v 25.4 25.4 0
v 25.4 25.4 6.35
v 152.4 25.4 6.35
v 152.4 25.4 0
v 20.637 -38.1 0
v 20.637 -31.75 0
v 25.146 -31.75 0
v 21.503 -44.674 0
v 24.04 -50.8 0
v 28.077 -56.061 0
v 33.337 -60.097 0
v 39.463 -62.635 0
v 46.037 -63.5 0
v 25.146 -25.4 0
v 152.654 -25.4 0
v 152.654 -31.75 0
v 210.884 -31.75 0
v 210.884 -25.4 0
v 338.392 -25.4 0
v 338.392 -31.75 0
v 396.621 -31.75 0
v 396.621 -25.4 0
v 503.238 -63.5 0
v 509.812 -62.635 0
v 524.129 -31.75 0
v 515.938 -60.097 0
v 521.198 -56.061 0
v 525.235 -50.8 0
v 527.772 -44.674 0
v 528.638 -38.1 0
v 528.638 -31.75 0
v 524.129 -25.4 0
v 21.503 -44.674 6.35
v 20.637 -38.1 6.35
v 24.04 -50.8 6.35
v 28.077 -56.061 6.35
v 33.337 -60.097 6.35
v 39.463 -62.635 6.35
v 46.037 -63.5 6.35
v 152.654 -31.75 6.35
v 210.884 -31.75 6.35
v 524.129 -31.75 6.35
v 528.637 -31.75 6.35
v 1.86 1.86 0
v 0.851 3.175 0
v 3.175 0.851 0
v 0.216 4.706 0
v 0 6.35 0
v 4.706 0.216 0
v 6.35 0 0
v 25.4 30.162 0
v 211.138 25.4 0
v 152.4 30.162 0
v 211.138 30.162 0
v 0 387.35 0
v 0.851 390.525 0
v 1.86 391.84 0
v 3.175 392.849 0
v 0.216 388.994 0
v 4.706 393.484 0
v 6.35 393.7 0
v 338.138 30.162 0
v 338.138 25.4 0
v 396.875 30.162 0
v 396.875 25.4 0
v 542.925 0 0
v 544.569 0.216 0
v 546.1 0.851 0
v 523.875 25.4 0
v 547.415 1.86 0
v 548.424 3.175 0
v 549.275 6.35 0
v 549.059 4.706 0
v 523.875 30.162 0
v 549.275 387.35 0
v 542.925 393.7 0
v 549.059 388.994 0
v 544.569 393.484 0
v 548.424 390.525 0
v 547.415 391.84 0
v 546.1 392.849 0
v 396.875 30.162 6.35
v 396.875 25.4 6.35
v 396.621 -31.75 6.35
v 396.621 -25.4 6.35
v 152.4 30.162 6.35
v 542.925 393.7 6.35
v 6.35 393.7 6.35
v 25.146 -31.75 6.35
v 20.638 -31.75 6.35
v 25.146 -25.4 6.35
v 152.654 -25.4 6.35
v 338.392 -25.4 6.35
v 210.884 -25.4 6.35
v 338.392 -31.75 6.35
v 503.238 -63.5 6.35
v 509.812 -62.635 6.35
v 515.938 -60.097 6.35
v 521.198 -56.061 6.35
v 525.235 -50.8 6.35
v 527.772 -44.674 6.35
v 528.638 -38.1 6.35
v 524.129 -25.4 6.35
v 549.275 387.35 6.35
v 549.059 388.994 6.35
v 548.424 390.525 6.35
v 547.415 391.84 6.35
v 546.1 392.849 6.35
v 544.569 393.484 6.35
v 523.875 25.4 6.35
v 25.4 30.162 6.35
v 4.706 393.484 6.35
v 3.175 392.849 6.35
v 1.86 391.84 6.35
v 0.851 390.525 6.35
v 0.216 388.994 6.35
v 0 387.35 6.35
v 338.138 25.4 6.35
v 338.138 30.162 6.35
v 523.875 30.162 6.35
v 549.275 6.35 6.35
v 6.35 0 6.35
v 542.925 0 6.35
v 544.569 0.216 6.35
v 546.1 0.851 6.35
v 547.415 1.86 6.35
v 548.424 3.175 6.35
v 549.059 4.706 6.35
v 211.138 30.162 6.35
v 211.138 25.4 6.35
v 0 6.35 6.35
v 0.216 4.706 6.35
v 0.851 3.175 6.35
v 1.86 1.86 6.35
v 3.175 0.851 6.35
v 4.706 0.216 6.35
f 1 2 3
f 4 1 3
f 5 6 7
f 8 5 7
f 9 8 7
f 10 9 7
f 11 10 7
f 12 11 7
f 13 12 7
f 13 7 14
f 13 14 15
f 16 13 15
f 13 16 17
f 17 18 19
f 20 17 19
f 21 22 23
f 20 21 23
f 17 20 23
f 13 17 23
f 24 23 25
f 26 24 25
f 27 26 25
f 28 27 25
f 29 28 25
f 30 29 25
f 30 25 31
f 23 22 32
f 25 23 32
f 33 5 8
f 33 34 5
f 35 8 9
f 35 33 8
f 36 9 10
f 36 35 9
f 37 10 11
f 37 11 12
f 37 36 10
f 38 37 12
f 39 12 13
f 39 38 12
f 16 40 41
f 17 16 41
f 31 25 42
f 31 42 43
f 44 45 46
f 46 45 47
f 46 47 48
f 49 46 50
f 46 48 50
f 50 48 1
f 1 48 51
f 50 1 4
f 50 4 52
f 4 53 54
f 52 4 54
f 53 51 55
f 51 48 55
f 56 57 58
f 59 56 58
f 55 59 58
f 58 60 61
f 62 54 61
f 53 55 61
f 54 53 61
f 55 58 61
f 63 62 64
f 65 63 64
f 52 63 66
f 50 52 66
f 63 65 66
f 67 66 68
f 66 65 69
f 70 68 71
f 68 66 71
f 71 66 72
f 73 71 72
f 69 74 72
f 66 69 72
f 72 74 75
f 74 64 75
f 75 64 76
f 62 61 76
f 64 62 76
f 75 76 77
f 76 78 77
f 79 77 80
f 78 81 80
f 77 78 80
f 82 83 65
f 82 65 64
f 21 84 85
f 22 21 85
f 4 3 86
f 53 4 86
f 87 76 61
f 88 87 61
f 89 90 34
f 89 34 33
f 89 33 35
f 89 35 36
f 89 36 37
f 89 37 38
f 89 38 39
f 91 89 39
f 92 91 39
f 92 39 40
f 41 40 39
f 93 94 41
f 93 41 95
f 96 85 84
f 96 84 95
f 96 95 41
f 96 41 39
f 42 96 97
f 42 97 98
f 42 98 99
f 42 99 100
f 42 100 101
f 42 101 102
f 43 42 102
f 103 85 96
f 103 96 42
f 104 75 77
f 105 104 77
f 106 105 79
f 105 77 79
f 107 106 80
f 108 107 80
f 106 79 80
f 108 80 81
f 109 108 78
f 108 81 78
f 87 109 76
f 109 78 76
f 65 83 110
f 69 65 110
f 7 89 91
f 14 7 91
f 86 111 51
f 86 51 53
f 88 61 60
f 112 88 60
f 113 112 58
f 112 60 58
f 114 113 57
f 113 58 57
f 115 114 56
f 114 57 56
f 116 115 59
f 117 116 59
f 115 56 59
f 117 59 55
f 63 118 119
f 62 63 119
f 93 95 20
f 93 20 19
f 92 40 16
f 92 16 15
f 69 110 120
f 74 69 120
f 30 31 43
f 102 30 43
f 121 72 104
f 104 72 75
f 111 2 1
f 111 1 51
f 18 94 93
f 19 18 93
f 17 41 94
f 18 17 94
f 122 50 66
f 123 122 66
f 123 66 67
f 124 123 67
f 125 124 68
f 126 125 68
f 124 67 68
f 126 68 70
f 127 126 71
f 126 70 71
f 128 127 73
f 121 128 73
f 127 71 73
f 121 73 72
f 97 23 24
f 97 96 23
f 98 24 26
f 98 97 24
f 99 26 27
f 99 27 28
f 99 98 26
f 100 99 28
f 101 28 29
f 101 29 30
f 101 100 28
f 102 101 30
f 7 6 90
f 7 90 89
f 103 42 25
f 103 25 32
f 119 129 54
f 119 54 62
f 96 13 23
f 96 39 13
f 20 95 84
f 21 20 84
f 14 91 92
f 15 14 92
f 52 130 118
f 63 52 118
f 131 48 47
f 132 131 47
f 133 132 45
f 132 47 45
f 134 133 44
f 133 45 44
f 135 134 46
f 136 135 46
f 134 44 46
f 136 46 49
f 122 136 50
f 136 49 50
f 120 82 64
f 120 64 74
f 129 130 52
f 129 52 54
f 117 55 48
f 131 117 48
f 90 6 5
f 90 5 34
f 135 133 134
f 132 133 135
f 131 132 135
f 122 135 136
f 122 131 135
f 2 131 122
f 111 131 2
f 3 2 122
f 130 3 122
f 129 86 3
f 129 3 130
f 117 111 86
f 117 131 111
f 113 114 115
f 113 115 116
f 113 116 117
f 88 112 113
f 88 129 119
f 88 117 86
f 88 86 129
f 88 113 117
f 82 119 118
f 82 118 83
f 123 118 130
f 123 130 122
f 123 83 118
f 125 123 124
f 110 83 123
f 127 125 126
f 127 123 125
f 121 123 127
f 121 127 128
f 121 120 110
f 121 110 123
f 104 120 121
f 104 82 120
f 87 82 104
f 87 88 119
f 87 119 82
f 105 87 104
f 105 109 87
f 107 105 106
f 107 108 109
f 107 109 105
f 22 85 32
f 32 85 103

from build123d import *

# Parameters (mm, degrees)
BOSS_EXTRUDE1_DEPTH = 6.35
SKETCH2_W           = 127
SKETCH2_H           = 4.7625
CUT_EXTRUDE1_DEPTH  = 676.827668955
SKETCH3_W           = 508
SKETCH3_H           = 6.35
BOSS_EXTRUDE2_DEPTH = 38.1
SKETCH8_W           = 4.5085
SKETCH8_H           = 6.35
SKETCH8_W_2         = 58.2295
CUT_EXTRUDE2_DEPTH  = 676.827668955
FILLET1_R           = 25.4


with BuildPart() as part:
    # Sketch1 → Boss-Extrude1 (new body)
    with BuildSketch(Plane.XY):
        with BuildLine():
            Line((6.35, 0), (542.925, 0))
            ThreePointArc((542.925, 0), (547.415128061, 1.859871939), (549.275, 6.35))
            Line((549.275, 6.35), (549.275, 387.35))
            ThreePointArc((549.275, 387.35), (547.415128061, 391.840128061), (542.925, 393.7))
            Line((542.925, 393.7), (6.35, 393.7))
            ThreePointArc((6.35, 393.7), (1.859871939, 391.840128061), (0, 387.35))
            Line((0, 387.35), (0, 6.35))
            ThreePointArc((0, 6.35), (1.859871939, 1.859871939), (6.35, 0))
        make_face()
    extrude(amount=BOSS_EXTRUDE1_DEPTH)

    # Sketch2 → Cut-Extrude1 (cut, through all)
    with BuildSketch(Plane.XY.offset(6.35)):
        with Locations((460.375, 27.78125)):
            Rectangle(SKETCH2_W, SKETCH2_H)
        with Locations((274.6375, 27.78125)):
            Rectangle(SKETCH2_W, SKETCH2_H)
        with Locations((88.9, 27.78125)):
            Rectangle(SKETCH2_W, SKETCH2_H)
    extrude(amount=-CUT_EXTRUDE1_DEPTH, mode=Mode.SUBTRACT)


with BuildPart() as body_2:
    # Sketch3 → Boss-Extrude2 (new body)
    with BuildSketch(Plane.XZ.offset(25.4)):
        with Locations((274.6375, 3.175)):
            Rectangle(SKETCH3_W, SKETCH3_H)
    extrude(amount=BOSS_EXTRUDE2_DEPTH)

    # Sketch8 → Cut-Extrude2 (cut, through all)
    with BuildSketch(Plane.XY.offset(6.35)):
        with Locations((22.89175, -28.575)):
            Rectangle(SKETCH8_W, SKETCH8_H)
        with Locations((181.76875, -28.575)):
            Rectangle(SKETCH8_W_2, SKETCH8_H)
        with Locations((367.50625, -28.575)):
            Rectangle(SKETCH8_W_2, SKETCH8_H)
        with Locations((526.38325, -28.575)):
            Rectangle(SKETCH8_W, SKETCH8_H)
    extrude(amount=-CUT_EXTRUDE2_DEPTH, mode=Mode.SUBTRACT)

    # Fillet1
    fillet1_edges = [body_2.edges().sort_by_distance(p)[0] for p in [
        (20.6375, -63.5, 3.175),
        (528.6375, -63.5, 3.175),
    ]]
    fillet(fillet1_edges, radius=FILLET1_R)


solid = Compound([part.part, body_2.part])
